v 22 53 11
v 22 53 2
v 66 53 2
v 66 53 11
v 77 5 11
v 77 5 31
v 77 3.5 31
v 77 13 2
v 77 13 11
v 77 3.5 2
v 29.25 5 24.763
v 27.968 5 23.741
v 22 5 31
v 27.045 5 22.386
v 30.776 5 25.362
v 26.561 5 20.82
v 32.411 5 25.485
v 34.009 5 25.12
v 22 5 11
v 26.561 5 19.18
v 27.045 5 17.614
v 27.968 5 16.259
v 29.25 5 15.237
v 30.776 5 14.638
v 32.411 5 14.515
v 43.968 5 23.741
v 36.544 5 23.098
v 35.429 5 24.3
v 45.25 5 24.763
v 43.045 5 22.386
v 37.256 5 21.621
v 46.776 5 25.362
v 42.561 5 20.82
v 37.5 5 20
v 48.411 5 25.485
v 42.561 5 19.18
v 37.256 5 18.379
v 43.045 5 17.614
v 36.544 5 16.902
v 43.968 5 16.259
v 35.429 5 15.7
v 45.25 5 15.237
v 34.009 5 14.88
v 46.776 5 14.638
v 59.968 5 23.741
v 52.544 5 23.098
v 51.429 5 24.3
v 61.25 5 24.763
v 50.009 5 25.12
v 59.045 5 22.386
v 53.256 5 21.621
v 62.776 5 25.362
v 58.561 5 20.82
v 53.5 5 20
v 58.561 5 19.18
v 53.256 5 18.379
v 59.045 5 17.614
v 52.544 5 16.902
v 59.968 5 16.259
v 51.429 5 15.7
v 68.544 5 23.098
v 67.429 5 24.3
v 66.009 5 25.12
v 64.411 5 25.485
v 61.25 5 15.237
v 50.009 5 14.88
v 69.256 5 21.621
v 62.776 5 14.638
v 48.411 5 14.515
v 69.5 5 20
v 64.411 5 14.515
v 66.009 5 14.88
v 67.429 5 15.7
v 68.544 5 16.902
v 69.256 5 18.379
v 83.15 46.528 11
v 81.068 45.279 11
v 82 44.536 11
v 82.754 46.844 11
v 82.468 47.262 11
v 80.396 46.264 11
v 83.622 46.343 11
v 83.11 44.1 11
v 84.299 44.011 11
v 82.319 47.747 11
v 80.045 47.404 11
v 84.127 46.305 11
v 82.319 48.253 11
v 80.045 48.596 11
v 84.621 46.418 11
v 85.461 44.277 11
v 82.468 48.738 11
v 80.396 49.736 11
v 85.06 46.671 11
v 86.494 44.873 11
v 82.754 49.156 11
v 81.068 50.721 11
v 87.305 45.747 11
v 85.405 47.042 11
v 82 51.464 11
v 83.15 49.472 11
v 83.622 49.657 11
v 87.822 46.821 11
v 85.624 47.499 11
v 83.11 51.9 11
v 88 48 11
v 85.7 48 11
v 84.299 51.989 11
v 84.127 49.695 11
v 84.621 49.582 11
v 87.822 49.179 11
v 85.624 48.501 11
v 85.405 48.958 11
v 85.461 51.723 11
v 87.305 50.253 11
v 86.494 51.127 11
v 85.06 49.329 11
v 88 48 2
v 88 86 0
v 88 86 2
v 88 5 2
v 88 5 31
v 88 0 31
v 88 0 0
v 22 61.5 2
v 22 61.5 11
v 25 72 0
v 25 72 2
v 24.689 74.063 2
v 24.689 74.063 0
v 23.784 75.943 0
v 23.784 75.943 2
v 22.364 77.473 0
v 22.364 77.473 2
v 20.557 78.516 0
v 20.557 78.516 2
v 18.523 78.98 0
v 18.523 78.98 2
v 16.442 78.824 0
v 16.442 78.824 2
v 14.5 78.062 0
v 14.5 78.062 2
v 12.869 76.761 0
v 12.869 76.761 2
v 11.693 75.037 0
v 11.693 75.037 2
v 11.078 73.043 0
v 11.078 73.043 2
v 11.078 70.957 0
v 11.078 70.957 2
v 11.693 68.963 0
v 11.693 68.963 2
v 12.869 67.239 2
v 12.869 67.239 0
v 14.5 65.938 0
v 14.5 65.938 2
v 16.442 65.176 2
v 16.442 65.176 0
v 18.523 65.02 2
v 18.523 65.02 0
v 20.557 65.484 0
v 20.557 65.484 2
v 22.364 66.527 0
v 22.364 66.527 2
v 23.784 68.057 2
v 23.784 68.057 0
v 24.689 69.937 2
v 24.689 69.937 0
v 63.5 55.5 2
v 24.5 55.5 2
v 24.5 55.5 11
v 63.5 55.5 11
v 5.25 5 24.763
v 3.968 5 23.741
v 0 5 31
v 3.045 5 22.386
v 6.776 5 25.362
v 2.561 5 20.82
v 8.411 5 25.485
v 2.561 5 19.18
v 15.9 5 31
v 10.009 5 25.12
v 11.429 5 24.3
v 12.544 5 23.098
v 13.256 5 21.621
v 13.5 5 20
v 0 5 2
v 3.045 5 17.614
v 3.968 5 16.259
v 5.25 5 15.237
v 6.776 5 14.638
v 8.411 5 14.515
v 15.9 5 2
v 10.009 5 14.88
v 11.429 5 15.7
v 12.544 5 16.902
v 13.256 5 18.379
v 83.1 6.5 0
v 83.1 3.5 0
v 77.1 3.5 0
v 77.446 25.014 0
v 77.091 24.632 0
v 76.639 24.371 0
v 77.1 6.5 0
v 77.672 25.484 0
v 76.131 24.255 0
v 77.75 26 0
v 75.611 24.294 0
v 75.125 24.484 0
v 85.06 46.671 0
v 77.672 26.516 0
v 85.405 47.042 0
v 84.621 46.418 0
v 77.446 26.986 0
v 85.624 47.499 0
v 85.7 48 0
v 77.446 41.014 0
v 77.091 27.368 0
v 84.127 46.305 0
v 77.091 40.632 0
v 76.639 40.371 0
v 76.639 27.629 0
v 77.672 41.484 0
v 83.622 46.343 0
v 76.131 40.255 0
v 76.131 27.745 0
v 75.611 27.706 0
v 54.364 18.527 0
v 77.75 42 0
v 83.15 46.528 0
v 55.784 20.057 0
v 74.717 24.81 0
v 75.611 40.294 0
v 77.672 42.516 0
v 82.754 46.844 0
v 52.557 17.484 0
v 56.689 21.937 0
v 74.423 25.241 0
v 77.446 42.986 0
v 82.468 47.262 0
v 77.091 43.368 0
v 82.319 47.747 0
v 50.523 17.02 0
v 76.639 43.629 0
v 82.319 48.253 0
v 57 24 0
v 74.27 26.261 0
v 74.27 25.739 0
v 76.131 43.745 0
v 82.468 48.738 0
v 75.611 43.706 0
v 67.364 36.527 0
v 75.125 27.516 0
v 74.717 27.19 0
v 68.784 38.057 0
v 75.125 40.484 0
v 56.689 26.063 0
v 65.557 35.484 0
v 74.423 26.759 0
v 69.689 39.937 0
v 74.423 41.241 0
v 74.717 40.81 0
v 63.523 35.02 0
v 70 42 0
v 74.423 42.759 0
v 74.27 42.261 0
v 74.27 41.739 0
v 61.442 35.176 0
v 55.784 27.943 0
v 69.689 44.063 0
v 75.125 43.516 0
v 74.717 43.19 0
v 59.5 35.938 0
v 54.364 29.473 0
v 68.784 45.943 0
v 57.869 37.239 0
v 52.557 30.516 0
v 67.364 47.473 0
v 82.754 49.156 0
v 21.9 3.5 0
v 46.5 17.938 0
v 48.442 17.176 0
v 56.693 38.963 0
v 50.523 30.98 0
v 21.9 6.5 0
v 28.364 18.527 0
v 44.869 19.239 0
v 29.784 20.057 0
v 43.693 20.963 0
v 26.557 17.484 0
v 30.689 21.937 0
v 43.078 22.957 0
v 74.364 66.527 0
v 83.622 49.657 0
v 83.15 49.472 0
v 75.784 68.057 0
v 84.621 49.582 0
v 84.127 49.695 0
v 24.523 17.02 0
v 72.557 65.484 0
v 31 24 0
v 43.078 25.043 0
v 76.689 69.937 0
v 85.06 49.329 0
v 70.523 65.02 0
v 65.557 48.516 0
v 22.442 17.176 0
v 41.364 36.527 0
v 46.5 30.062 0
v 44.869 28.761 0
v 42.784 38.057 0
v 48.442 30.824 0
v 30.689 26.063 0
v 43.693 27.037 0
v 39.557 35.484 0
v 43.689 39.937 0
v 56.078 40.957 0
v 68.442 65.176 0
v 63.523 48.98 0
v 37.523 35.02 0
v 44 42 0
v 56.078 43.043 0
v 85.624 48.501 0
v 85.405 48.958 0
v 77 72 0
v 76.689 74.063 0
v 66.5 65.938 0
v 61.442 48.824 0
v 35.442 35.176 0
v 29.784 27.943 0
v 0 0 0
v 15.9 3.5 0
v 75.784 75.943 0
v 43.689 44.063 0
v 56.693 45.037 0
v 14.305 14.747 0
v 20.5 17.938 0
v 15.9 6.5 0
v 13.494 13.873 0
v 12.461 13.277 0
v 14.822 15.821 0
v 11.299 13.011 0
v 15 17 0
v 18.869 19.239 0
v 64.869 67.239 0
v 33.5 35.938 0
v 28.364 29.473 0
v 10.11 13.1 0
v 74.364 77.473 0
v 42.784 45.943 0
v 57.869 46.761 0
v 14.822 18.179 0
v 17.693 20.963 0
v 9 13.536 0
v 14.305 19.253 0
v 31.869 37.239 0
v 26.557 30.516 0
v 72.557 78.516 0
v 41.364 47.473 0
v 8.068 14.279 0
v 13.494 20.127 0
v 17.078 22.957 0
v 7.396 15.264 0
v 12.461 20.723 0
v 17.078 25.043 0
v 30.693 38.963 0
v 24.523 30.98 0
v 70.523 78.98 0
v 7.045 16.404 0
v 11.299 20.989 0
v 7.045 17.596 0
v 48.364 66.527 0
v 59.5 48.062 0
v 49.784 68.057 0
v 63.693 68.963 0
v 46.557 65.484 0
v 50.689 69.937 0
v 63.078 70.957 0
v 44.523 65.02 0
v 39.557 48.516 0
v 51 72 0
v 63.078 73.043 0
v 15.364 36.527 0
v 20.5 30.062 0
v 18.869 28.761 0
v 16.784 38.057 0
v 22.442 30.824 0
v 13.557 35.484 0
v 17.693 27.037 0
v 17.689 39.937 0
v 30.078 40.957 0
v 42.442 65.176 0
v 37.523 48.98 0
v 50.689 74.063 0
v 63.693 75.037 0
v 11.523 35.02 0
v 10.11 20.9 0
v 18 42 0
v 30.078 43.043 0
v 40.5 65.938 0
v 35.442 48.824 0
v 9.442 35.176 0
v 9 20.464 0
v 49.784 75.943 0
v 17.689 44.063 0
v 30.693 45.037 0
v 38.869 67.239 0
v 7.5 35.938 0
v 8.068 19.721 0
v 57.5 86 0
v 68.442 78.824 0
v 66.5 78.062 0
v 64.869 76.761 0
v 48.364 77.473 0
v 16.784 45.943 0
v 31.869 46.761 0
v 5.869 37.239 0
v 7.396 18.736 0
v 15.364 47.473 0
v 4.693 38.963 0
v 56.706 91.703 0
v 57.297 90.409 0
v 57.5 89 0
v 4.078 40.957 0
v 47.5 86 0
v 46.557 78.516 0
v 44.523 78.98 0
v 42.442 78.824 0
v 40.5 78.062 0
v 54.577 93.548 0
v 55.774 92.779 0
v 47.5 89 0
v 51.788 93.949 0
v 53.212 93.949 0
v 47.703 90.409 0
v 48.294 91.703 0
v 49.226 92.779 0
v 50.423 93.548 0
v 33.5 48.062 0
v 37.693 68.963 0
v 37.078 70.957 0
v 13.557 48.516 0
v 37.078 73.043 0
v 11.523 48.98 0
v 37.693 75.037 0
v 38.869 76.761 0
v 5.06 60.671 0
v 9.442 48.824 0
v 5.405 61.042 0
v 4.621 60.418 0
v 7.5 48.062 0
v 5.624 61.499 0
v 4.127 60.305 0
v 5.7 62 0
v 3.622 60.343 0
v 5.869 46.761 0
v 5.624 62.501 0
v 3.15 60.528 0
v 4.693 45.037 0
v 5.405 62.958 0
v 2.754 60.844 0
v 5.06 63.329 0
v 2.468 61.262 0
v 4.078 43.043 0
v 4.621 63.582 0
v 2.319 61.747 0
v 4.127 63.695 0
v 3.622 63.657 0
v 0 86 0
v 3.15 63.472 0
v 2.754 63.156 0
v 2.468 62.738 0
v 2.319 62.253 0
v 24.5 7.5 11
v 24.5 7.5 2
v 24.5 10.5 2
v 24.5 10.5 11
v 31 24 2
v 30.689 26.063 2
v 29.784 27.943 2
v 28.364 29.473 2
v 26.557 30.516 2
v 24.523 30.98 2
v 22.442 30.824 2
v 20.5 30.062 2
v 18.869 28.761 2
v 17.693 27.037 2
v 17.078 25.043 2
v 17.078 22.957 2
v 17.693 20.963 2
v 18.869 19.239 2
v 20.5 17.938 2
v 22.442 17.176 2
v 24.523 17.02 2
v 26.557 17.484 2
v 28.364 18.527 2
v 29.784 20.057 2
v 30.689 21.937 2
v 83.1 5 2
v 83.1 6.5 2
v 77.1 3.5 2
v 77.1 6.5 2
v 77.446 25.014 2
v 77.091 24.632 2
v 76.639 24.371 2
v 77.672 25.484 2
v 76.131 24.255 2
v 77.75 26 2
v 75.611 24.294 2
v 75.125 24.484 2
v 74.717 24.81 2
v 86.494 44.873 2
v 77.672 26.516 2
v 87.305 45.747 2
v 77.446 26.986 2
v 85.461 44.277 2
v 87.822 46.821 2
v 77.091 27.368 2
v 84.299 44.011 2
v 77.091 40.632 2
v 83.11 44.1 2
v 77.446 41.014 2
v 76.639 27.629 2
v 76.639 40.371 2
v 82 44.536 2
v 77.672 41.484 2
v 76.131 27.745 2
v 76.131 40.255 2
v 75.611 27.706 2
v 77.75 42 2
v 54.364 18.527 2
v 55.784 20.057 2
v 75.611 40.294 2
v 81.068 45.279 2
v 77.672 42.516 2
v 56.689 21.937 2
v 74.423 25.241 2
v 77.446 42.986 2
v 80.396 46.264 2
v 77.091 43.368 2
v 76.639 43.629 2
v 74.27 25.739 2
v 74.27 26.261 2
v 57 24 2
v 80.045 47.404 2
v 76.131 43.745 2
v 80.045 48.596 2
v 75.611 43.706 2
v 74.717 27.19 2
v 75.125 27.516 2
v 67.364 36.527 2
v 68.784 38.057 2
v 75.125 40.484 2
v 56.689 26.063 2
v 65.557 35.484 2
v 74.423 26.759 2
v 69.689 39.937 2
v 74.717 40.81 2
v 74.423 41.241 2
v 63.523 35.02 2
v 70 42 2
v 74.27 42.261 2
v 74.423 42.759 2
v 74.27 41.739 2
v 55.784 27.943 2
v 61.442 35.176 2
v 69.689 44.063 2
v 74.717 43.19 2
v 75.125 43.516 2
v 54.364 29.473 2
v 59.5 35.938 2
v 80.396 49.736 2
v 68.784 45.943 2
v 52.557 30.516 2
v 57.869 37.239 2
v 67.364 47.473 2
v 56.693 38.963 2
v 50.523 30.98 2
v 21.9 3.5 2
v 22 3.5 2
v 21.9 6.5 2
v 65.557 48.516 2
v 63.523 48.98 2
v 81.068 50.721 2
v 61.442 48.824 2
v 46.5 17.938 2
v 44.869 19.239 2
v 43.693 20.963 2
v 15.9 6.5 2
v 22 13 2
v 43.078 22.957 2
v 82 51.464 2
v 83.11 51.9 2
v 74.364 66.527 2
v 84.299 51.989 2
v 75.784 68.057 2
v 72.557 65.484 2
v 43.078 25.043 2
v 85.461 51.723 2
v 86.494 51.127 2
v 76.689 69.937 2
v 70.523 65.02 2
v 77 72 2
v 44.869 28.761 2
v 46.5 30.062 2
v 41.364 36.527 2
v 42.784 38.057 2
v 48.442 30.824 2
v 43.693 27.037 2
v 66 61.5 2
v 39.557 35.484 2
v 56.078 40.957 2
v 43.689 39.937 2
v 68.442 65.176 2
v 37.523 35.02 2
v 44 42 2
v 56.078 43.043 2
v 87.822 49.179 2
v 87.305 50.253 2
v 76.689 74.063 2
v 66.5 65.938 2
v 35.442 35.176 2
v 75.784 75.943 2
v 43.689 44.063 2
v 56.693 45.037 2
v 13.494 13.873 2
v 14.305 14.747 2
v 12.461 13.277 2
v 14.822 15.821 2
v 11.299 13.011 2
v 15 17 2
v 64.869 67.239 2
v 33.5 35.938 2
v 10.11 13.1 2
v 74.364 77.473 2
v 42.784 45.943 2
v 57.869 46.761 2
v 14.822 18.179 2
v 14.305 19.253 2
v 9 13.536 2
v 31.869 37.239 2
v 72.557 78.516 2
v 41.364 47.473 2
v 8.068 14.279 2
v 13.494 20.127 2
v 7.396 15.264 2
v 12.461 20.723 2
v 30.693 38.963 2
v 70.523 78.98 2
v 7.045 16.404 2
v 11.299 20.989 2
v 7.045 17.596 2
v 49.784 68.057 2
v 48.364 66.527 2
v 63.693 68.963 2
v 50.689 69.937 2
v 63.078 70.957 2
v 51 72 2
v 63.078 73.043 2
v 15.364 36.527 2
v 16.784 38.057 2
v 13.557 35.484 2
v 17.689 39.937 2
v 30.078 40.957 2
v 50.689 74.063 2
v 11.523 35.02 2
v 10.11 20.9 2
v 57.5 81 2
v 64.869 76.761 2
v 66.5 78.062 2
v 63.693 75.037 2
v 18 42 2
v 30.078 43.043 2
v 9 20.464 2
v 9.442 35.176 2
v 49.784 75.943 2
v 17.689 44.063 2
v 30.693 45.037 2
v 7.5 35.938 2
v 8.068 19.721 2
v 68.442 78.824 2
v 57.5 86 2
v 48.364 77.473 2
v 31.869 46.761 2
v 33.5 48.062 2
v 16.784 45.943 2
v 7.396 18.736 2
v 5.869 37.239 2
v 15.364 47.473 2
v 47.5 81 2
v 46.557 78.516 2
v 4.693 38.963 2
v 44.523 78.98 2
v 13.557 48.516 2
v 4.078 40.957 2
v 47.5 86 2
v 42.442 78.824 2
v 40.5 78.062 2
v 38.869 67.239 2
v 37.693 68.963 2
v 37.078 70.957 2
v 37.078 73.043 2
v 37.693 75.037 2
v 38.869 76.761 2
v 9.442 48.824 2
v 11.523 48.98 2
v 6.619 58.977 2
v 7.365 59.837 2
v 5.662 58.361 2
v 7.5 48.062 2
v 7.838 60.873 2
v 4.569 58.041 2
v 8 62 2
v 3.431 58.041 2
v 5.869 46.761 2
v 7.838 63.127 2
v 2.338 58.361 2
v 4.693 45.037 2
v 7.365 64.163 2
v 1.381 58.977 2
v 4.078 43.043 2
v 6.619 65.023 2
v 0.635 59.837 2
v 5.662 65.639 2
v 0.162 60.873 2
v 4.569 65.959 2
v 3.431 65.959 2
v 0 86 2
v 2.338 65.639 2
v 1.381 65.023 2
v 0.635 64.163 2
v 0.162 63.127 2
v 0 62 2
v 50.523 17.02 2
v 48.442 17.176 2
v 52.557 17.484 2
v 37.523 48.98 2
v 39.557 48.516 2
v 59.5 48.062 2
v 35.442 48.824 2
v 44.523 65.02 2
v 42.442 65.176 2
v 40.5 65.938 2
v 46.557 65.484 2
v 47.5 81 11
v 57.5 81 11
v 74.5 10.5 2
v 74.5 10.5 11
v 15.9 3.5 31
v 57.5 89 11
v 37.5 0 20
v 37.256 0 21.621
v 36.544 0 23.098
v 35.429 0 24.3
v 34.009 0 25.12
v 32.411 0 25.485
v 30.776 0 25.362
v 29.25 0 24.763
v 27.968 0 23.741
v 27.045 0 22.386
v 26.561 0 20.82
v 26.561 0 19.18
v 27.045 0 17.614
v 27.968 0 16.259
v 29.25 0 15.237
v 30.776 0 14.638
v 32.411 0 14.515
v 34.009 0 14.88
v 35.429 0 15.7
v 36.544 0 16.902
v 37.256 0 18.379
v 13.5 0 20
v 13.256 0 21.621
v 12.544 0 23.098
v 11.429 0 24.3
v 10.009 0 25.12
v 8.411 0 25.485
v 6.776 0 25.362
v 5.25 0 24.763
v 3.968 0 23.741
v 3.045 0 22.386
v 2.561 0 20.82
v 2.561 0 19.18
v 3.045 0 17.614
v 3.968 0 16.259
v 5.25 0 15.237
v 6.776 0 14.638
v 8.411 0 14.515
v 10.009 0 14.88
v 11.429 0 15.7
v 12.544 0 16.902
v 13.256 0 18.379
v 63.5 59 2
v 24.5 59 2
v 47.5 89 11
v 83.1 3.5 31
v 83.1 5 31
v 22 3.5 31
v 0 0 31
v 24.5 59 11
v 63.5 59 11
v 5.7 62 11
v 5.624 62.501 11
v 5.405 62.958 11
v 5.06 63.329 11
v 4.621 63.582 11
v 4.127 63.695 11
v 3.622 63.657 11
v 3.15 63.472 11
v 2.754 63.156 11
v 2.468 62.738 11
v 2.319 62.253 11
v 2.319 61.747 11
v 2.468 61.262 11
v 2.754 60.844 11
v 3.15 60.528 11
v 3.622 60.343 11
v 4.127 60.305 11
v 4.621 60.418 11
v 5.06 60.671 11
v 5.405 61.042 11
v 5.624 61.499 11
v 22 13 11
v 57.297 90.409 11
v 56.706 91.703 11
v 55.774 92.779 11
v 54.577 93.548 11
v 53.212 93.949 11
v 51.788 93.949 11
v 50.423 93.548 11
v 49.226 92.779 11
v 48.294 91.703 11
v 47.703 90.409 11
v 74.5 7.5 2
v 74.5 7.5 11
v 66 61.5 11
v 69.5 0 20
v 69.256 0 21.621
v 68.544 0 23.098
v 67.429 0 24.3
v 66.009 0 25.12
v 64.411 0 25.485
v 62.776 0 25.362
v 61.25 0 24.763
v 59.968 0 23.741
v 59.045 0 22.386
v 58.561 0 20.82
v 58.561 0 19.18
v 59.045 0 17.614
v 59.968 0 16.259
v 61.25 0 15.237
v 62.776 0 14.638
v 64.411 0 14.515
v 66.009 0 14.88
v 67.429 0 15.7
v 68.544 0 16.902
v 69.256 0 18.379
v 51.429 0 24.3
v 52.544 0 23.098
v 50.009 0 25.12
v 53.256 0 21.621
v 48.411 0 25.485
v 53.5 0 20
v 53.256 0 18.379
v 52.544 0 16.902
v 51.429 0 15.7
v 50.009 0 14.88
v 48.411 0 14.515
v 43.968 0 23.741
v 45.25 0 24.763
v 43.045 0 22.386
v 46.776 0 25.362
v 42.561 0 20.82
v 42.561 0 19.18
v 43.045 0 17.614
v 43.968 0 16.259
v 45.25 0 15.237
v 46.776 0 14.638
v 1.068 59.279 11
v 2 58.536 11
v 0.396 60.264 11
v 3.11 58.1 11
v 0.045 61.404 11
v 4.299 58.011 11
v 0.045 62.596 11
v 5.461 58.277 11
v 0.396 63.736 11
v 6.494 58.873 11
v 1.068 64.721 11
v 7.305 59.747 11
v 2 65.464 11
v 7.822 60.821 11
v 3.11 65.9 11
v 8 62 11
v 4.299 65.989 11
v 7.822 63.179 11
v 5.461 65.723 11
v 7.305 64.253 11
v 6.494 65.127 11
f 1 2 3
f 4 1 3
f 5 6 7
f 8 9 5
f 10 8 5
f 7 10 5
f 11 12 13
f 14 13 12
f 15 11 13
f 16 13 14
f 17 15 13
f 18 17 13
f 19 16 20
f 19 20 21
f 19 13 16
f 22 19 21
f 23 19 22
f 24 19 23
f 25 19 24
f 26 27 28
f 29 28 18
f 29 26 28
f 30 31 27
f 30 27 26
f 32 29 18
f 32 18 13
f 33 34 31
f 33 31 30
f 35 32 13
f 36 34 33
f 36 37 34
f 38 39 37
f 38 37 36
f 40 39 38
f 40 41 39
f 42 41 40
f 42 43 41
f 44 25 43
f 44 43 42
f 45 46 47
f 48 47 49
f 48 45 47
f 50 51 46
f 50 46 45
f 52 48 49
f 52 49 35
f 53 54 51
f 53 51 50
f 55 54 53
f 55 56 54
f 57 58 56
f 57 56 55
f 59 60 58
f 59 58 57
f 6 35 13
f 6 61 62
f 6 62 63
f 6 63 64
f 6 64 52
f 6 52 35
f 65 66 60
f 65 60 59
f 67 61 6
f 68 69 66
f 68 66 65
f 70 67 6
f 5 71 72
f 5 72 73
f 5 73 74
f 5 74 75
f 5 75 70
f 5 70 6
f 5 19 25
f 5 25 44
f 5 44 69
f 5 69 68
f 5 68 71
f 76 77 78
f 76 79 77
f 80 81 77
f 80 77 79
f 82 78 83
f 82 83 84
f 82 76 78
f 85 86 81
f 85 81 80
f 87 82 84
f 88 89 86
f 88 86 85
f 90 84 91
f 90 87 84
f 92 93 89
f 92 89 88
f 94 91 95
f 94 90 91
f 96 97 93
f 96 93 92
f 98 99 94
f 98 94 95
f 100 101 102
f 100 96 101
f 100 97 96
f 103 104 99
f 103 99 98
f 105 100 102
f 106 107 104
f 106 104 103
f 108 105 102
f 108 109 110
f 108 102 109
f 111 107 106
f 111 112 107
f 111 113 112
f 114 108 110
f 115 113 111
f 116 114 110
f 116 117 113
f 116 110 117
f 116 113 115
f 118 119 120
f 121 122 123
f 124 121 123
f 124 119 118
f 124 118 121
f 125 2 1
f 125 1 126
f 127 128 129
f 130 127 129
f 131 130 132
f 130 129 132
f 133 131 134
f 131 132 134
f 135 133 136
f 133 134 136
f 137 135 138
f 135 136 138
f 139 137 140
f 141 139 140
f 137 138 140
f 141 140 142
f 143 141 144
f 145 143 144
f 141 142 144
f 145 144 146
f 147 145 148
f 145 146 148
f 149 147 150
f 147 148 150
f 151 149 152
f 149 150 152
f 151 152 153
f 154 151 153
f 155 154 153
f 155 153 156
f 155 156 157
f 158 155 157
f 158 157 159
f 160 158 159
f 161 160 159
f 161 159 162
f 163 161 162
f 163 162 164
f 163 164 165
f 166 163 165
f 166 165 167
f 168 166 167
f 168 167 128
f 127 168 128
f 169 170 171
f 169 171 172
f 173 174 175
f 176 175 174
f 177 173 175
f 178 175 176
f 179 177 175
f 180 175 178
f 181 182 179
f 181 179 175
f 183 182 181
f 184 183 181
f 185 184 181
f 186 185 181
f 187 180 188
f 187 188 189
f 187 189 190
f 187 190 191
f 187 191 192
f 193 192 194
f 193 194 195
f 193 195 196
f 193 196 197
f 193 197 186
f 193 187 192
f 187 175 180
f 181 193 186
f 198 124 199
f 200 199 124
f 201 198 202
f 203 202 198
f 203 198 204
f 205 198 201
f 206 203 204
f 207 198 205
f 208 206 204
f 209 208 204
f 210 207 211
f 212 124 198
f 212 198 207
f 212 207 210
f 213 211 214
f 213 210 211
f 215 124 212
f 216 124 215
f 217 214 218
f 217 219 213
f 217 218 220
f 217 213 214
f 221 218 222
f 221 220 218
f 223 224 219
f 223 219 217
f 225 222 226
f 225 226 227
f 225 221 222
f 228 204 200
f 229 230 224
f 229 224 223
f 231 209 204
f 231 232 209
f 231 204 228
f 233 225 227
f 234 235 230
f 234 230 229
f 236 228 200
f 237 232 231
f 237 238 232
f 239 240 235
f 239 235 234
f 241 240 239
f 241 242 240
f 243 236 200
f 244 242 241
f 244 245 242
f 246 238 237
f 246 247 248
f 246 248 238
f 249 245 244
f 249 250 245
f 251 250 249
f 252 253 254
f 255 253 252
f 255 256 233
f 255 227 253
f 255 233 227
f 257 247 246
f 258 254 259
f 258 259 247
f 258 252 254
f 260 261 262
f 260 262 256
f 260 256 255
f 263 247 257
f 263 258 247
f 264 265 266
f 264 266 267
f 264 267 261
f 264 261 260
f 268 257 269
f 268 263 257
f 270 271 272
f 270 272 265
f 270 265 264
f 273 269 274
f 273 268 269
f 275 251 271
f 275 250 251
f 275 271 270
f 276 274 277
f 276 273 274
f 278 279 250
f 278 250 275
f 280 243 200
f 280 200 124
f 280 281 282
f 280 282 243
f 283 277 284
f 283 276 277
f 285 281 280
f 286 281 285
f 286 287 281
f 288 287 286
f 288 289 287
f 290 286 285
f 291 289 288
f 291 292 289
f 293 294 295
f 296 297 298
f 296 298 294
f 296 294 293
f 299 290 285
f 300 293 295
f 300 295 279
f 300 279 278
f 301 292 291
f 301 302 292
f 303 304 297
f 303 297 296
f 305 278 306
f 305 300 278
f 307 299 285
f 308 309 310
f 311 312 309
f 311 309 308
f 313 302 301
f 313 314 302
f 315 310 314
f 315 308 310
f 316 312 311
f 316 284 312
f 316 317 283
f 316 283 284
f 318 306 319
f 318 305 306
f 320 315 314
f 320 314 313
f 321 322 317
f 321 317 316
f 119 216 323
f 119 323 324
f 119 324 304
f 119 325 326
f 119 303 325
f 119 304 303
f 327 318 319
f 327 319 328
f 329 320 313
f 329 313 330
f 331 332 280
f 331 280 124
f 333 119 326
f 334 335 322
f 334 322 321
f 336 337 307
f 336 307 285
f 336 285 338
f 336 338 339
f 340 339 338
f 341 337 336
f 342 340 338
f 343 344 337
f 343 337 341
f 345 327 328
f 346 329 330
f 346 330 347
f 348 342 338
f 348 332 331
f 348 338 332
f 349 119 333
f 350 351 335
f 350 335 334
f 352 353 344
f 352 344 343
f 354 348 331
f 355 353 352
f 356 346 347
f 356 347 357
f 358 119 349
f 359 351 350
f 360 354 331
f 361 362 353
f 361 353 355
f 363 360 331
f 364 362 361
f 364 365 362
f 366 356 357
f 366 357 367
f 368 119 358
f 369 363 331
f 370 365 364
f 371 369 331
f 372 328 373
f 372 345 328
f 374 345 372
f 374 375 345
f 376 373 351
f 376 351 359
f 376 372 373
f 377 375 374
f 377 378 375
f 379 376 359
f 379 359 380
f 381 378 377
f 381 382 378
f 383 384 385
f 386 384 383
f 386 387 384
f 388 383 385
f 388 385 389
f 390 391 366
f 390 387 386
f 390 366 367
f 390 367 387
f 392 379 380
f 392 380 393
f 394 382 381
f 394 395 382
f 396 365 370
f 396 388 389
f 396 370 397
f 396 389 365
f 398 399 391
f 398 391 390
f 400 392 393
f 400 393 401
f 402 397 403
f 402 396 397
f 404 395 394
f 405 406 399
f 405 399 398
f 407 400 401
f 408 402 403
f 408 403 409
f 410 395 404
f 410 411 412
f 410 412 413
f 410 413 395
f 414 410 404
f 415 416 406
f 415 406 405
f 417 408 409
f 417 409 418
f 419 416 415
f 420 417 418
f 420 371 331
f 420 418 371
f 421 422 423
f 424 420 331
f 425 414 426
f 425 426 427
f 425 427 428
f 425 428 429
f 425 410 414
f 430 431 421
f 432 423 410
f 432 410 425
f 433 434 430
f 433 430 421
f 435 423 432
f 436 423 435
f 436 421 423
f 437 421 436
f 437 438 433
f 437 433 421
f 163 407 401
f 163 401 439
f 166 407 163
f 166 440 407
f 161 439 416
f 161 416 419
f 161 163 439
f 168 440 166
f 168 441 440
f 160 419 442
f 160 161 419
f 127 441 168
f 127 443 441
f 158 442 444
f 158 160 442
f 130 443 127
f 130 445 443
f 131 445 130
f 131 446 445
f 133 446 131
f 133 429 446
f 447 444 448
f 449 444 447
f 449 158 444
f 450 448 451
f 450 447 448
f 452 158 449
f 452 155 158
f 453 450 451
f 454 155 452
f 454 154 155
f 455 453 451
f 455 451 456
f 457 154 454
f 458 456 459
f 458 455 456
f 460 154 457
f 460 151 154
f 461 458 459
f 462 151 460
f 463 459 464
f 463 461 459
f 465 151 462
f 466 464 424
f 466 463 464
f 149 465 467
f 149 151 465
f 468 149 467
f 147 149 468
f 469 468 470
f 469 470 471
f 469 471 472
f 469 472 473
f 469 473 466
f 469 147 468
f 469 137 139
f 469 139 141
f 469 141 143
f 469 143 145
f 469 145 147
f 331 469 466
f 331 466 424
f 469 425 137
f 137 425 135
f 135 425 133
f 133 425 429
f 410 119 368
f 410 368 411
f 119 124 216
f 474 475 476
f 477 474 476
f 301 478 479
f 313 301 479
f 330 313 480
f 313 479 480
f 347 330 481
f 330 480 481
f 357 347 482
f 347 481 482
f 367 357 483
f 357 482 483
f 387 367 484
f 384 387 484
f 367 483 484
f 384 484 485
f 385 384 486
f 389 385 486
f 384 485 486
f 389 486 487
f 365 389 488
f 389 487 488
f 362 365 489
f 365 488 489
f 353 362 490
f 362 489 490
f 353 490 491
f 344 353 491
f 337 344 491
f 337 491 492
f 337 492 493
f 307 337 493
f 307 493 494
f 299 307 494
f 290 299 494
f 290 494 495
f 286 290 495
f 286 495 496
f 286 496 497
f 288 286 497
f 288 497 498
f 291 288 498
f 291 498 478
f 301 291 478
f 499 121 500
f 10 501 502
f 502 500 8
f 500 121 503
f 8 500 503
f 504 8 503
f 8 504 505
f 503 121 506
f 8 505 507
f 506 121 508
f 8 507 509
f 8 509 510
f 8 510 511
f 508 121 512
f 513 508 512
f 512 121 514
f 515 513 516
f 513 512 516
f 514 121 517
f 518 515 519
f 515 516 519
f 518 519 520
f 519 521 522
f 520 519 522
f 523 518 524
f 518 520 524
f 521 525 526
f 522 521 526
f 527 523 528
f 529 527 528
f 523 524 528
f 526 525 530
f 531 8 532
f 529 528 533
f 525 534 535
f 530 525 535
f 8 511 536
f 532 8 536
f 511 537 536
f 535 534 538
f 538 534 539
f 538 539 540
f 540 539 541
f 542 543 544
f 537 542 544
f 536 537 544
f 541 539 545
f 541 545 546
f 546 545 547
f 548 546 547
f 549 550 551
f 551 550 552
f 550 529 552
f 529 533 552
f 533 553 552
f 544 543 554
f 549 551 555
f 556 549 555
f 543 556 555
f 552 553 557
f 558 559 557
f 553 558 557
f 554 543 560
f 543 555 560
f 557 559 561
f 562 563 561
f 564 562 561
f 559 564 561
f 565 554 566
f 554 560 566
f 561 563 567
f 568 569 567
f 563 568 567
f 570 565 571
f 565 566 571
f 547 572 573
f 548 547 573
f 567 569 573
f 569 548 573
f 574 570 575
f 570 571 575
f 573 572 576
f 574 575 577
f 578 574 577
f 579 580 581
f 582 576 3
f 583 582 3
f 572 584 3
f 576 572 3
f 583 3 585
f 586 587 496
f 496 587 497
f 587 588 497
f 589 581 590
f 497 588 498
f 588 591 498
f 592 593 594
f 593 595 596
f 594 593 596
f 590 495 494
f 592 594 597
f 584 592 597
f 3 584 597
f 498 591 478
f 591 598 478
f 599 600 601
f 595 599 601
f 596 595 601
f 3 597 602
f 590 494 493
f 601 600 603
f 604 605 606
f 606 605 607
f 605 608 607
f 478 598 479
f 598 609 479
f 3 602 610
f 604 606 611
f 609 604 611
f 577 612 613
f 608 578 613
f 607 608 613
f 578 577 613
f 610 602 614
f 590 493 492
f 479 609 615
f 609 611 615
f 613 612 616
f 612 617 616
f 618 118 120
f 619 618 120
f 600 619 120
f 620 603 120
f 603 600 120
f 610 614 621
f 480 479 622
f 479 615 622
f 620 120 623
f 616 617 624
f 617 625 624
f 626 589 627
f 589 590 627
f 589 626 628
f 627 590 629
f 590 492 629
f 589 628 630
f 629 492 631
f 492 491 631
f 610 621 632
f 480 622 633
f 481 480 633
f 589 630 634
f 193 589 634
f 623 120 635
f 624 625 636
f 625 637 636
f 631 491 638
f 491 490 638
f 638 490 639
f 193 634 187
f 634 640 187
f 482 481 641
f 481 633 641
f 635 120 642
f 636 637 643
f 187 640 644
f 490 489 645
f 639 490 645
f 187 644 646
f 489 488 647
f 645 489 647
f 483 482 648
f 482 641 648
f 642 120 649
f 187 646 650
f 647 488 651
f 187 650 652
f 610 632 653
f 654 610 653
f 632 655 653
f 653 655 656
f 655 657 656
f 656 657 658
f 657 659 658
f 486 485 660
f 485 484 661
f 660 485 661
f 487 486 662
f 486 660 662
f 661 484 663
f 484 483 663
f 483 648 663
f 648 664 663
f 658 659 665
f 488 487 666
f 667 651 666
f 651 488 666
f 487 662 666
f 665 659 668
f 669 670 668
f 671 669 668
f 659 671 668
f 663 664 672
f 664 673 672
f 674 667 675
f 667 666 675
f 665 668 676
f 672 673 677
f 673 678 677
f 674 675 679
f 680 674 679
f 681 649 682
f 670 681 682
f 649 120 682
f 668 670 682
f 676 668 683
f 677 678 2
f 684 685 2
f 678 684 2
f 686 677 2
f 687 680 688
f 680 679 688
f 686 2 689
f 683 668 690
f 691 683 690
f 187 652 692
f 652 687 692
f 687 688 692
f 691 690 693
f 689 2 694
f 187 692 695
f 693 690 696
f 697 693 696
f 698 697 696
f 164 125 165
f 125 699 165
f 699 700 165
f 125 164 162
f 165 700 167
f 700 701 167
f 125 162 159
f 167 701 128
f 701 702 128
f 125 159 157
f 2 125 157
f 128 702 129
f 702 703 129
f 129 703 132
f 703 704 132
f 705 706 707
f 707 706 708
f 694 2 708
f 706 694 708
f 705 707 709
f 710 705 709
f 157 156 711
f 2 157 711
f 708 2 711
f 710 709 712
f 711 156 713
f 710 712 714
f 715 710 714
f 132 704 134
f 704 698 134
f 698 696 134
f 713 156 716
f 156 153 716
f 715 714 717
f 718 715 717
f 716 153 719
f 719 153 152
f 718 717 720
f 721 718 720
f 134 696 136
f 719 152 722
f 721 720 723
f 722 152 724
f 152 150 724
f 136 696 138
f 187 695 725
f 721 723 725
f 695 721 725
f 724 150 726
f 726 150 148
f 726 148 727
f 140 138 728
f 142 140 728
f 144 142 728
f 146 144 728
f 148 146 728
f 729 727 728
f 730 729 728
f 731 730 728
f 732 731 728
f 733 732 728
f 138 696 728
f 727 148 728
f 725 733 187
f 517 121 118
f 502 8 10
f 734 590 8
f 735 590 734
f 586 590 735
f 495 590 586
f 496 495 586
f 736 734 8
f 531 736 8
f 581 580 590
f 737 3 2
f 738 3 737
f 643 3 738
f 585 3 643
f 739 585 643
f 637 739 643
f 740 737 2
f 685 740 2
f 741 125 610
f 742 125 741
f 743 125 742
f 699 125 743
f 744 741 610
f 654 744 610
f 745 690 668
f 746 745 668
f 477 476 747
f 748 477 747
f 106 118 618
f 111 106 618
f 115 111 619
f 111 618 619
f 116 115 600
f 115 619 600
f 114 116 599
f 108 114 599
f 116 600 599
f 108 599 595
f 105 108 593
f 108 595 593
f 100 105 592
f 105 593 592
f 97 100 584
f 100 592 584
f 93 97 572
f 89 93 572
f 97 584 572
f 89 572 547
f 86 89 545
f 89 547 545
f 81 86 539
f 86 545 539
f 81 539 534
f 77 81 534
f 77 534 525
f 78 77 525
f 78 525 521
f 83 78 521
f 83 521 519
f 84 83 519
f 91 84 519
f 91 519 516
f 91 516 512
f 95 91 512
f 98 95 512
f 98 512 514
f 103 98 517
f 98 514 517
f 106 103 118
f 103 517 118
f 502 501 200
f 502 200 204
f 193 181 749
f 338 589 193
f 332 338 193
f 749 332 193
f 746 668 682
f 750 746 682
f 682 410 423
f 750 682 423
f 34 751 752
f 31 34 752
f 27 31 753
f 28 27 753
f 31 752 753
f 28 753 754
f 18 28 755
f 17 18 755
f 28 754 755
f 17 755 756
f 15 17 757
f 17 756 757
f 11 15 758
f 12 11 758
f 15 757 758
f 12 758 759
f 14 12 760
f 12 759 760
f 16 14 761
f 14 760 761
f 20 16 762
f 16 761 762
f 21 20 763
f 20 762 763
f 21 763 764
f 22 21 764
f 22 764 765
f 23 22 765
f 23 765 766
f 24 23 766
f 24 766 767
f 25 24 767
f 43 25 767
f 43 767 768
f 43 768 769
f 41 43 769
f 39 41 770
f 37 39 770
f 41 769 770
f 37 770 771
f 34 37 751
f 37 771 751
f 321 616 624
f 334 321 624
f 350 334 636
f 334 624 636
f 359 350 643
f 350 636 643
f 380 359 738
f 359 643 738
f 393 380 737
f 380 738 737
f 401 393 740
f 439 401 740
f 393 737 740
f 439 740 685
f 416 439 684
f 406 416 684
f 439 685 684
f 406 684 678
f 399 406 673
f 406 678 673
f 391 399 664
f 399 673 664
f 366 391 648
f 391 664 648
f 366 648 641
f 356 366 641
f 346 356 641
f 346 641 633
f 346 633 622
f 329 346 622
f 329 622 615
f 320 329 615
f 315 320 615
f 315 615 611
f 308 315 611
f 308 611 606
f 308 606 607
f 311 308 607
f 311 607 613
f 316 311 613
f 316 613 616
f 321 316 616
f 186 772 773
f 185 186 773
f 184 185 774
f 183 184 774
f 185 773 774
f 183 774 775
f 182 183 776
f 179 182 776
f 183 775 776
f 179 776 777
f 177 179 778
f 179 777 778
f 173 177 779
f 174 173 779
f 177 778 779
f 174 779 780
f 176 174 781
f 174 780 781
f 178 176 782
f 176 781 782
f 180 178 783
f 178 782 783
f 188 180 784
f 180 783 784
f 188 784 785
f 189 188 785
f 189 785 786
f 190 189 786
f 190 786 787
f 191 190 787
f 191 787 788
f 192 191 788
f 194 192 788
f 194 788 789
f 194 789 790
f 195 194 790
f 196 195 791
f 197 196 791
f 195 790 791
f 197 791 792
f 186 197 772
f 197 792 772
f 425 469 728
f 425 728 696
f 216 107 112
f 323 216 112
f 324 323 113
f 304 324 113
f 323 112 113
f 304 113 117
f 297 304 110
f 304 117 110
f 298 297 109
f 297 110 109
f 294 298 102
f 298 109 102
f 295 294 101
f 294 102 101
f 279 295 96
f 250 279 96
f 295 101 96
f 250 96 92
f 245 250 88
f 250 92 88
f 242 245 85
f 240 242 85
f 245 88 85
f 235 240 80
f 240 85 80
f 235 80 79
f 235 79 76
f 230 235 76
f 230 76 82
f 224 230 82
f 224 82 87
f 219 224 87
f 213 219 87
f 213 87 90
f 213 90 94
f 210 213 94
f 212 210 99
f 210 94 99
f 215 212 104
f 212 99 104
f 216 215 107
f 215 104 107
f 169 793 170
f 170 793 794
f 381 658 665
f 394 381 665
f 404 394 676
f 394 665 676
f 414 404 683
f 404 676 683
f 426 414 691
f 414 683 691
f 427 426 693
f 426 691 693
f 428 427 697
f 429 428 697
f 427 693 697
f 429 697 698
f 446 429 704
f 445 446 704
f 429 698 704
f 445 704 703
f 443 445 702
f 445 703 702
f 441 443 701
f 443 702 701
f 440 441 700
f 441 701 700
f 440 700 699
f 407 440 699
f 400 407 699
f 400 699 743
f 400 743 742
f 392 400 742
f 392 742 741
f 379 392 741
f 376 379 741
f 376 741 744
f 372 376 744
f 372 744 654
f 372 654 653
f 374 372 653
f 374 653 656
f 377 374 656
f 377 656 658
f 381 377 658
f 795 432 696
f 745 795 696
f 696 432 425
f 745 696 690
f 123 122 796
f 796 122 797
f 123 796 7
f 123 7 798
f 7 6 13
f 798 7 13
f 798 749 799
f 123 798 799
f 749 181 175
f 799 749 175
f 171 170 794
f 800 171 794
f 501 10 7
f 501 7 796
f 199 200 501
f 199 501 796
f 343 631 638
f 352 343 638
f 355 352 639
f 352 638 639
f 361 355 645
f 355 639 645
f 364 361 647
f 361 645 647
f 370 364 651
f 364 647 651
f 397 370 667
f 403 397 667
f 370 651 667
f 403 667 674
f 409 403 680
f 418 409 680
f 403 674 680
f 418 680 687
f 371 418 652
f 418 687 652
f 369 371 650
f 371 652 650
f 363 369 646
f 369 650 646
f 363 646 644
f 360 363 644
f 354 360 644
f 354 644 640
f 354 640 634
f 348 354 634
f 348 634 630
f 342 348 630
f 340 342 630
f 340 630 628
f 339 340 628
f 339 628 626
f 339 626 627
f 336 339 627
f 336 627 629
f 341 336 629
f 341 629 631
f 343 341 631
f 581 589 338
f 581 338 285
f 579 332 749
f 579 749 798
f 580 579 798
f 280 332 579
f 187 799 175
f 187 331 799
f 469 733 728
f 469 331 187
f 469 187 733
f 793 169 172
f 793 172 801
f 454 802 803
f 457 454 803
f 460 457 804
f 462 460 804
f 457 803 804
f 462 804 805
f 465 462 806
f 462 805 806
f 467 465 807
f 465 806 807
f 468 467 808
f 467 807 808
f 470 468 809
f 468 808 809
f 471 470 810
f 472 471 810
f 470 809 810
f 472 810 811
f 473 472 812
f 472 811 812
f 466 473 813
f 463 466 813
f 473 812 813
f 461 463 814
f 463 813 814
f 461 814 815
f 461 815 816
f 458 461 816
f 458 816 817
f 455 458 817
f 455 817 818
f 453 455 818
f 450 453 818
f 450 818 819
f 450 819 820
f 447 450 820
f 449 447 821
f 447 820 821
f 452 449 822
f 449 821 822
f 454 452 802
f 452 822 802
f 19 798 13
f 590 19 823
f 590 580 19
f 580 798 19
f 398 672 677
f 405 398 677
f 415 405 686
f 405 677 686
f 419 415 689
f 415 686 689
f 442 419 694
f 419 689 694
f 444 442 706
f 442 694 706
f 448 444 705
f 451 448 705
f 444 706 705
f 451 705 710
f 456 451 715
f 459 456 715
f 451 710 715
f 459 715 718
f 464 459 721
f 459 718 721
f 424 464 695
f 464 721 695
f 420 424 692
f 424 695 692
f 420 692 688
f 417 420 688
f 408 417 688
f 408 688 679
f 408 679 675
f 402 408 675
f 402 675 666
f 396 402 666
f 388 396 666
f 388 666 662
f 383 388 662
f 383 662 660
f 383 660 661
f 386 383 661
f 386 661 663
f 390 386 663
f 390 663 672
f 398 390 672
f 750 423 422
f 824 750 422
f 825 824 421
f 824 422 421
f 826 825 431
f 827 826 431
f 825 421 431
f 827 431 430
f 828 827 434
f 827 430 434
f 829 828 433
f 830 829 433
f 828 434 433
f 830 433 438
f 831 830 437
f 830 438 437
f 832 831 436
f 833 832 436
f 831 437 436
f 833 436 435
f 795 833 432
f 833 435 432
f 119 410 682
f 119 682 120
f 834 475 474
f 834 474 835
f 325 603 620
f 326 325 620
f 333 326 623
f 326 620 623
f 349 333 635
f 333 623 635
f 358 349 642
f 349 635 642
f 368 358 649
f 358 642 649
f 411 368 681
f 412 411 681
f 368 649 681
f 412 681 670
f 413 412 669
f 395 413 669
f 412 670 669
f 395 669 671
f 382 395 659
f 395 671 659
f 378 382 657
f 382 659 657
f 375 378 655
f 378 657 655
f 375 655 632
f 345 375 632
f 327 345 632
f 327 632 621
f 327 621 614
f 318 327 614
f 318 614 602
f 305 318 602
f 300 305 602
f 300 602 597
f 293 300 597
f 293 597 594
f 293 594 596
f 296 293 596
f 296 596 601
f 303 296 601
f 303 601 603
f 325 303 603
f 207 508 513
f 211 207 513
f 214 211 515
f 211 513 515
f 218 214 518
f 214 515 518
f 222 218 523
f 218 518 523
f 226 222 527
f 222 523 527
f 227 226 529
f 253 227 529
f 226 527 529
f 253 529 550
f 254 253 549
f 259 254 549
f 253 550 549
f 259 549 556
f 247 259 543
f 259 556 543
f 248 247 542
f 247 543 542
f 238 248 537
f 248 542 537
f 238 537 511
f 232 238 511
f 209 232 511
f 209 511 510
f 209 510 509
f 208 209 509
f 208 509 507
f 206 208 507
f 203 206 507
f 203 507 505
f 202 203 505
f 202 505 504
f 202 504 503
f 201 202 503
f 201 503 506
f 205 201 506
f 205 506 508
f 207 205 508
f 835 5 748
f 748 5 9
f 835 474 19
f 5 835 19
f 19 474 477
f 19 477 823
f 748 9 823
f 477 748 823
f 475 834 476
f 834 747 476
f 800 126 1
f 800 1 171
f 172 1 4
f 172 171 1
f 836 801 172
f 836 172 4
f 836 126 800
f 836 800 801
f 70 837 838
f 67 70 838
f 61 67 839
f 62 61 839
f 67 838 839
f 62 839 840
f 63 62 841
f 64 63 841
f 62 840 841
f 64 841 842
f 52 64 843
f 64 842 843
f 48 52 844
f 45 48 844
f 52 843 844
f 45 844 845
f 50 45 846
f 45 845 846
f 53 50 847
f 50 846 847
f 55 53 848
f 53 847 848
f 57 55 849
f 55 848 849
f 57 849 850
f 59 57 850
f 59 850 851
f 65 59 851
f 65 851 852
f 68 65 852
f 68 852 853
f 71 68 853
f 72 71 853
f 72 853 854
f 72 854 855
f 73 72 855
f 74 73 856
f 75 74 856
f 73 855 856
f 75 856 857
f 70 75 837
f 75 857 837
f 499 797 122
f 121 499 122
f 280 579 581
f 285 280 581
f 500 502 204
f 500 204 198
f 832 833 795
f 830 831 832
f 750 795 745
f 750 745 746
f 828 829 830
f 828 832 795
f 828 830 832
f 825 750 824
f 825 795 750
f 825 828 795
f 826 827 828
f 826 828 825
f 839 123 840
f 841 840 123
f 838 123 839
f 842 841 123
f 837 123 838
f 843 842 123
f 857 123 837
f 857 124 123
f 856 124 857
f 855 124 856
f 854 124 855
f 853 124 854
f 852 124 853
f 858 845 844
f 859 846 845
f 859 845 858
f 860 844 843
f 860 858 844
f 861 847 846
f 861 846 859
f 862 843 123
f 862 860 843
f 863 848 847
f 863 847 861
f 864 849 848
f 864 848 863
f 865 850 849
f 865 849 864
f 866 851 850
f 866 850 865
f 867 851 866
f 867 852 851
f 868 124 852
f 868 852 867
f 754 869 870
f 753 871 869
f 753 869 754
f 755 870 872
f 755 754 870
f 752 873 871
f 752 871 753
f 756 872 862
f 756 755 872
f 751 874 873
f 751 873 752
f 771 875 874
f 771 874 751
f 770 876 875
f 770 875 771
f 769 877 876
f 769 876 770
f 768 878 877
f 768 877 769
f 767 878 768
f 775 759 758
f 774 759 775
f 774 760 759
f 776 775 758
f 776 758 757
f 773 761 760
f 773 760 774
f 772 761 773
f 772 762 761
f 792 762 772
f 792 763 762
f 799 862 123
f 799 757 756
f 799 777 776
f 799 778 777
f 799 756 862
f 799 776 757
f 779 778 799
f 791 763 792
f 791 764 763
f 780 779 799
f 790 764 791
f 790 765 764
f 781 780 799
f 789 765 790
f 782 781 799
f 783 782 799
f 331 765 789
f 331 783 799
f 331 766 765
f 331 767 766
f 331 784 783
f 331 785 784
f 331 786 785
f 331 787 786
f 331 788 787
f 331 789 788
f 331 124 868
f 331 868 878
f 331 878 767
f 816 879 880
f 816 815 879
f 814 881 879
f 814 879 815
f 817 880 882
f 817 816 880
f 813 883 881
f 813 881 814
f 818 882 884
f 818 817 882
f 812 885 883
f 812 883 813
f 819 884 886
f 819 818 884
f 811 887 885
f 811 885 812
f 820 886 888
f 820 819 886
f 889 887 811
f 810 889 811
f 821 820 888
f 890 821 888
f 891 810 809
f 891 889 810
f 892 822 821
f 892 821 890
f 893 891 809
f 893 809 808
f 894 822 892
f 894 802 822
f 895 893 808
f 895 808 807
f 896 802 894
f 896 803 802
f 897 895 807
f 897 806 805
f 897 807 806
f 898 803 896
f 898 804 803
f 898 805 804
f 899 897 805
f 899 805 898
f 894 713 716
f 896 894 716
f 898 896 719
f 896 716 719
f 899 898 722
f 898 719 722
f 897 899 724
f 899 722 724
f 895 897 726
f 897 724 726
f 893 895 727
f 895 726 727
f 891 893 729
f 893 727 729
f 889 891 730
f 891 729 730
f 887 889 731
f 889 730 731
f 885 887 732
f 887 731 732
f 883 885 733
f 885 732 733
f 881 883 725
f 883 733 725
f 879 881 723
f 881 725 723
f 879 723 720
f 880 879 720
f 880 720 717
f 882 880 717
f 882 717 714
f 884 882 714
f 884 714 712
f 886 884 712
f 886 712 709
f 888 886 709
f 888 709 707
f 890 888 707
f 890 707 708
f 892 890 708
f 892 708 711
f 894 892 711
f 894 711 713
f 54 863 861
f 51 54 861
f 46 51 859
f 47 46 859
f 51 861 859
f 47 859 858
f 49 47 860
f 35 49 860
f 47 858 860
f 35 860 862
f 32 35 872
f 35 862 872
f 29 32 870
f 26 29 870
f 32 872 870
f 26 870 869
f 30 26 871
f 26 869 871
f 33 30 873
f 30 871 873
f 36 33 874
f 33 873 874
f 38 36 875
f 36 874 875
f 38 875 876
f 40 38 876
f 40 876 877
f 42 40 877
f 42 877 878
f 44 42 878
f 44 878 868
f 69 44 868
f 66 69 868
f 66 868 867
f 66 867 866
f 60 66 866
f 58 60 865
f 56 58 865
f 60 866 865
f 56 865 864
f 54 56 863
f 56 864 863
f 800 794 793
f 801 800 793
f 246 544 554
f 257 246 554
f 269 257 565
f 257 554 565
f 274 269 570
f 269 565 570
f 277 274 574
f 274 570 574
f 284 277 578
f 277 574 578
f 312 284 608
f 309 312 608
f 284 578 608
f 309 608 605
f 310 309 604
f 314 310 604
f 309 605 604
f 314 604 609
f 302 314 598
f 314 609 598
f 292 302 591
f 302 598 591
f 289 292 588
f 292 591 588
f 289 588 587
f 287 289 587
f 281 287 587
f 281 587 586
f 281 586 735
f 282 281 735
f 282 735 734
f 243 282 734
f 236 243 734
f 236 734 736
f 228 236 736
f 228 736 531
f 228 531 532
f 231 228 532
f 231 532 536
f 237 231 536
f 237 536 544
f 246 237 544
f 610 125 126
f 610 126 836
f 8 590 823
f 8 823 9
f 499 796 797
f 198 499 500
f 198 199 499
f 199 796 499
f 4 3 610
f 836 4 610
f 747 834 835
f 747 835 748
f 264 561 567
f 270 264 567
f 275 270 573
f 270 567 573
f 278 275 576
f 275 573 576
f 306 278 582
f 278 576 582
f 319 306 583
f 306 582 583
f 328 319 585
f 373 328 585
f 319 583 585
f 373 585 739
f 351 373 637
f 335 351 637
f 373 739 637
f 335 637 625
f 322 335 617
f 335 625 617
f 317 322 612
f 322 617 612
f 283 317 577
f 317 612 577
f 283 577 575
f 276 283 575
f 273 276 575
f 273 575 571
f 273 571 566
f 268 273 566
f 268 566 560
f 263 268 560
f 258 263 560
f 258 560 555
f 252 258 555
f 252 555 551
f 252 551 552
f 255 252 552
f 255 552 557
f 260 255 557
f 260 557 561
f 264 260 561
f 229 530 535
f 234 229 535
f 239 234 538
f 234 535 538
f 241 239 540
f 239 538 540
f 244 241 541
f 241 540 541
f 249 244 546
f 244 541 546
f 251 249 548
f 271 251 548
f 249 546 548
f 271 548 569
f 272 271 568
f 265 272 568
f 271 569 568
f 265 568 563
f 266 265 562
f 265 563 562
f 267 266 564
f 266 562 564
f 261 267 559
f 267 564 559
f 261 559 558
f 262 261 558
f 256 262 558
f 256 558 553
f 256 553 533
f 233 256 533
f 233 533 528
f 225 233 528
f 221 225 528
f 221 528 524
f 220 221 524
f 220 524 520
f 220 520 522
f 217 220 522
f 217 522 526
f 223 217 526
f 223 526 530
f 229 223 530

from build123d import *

# Parameters (mm, degrees)
PAD_DEPTH       = 2
SKETCH001_W     = 50
SKETCH001_H     = 3
SKETCH001_W_2   = 44
SKETCH001_H_2   = 8.5
SKETCH001_W_3   = 39
SKETCH001_H_3   = 3.5
SKETCH001_R     = 4
PAD001_DEPTH    = 9
SKETCH003_R     = 1.75
SKETCH003_R_2   = 7
SKETCH003_R_3   = 4
SKETCH003_W     = 6
SKETCH003_H     = 3
POCKET_DEPTH    = 5
PAD002_DEPTH    = 20
SKETCH006_R     = 5.5
POCKET001_DEPTH = 5
SKETCH004_R     = 1.7
POCKET002_DEPTH = 11


with BuildPart() as part:
    # Sketch → Pad (new body)
    with BuildSketch(Plane.XY):
        with BuildLine():
            Line((0, 0), (0, 86))
            Line((0, 86), (47.5, 86))
            Line((47.5, 86), (47.5, 89))
            ThreePointArc((57.5, 89), (52.5, 94), (47.5, 89))
            Line((57.5, 89), (57.5, 86))
            Line((57.5, 86), (88, 86))
            Line((88, 86), (88, 0))
            Line((88, 0), (0, 0))
        make_face()
    extrude(amount=PAD_DEPTH)

    # Sketch001 → Pad001 (new body)
    with BuildSketch(Plane.XY.offset(2)):
        Polygon((0, 0), (0, 5), (15.9, 5), (15.9, 3.5), (22, 3.5), (22, 13), (77, 13), (77, 3.5), (83.1, 3.5), (83.1, 5), (88, 5), (88, 0), align=None)
        with Locations((49.5, 9)):
            Rectangle(SKETCH001_W, SKETCH001_H, mode=Mode.SUBTRACT)
        with Locations((44, 57.25)):
            Rectangle(SKETCH001_W_2, SKETCH001_H_2)
        with Locations((44, 57.25)):
            Rectangle(SKETCH001_W_3, SKETCH001_H_3, mode=Mode.SUBTRACT)
        with BuildLine():
            Line((47.5, 89), (47.5, 81))
            Line((47.5, 81), (57.5, 81))
            Line((57.5, 81), (57.5, 89))
            ThreePointArc((57.5, 89), (52.5, 94), (47.5, 89))
        make_face()
        with Locations((4, 62)):
            Circle(SKETCH001_R)
        with Locations((84, 48)):
            Circle(SKETCH001_R)
    extrude(amount=PAD001_DEPTH)

    # Sketch003 → Pocket (cut)
    with BuildSketch(Plane.XY.offset(2)):
        with Locations((76, 42)):
            Circle(SKETCH003_R)
        with Locations((76, 26)):
            Circle(SKETCH003_R)
        with Locations((37, 42)):
            Circle(SKETCH003_R_2)
        with Locations((24, 24)):
            Circle(SKETCH003_R_2)
        with Locations((63, 42)):
            Circle(SKETCH003_R_2)
        with Locations((50, 24)):
            Circle(SKETCH003_R_2)
        with Locations((70, 72)):
            Circle(SKETCH003_R_2)
        with Locations((44, 72)):
            Circle(SKETCH003_R_2)
        with Locations((18, 72)):
            Circle(SKETCH003_R_2)
        with Locations((11, 42)):
            Circle(SKETCH003_R_2)
        with Locations((11, 17)):
            Circle(SKETCH003_R_3)
        with Locations((80.1, 5)):
            Rectangle(SKETCH003_W, SKETCH003_H)
        with Locations((18.9, 5)):
            Rectangle(SKETCH003_W, SKETCH003_H)
    extrude(amount=-POCKET_DEPTH, mode=Mode.SUBTRACT)

    # Sketch005 → Pad002 (new body)
    with BuildSketch(Plane.XY.offset(11)):
        Polygon((0, 0), (0, 5), (15.9, 5), (15.9, 3.5), (22, 3.5), (22, 5), (77, 5), (77, 3.5), (83.1, 3.5), (83.1, 5), (88, 5), (88, 0), align=None)
    extrude(amount=PAD002_DEPTH)

    # Sketch006 → Pocket001 (cut)
    with BuildSketch(Plane.XZ):
        with Locations((8, 20)):
            Circle(SKETCH006_R)
        with Locations((32, 20)):
            Circle(SKETCH006_R)
        with Locations((48, 20)):
            Circle(SKETCH006_R)
        with Locations((64, 20)):
            Circle(SKETCH006_R)
    extrude(amount=-POCKET001_DEPTH, mode=Mode.SUBTRACT)

    # Sketch004 → Pocket002 (cut)
    with BuildSketch(Plane.XY.offset(11)):
        with Locations((4, 62)):
            Circle(SKETCH004_R)
        with Locations((84, 48)):
            Circle(SKETCH004_R)
    extrude(amount=-POCKET002_DEPTH, mode=Mode.SUBTRACT)


solid = part.part
